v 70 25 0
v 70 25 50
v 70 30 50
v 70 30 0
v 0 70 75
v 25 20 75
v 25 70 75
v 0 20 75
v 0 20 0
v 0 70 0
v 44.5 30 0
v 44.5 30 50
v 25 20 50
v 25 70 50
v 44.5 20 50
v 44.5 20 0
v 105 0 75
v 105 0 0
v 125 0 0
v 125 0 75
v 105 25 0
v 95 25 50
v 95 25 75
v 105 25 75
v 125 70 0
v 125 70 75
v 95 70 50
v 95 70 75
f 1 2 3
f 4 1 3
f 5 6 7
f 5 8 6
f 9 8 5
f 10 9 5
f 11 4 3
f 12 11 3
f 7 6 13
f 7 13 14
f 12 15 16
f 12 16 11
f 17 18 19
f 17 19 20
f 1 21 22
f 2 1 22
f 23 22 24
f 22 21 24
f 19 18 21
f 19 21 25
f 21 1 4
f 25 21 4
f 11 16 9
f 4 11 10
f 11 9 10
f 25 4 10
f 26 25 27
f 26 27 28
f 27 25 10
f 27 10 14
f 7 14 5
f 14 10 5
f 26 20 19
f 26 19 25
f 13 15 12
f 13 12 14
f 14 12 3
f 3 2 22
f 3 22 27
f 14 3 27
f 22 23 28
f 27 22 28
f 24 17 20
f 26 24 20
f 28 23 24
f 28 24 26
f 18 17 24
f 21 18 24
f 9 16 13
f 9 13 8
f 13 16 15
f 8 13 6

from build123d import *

# Parameters (mm, degrees)
F0_W     = 70
F0_H     = 75
F1_DEPTH = 125
F3_START = -20
F2_W     = 20
F2_H     = 75
F3_DEPTH = 105.001
F5_START = -55
F4_W     = 10
F4_H     = 75
F5_DEPTH = 25.5
F7_START = -30
F6_W     = 70
F6_H     = 25
F7_DEPTH = 70
F9_START = -20
F8_W     = 5
F8_H     = 75
F9_DEPTH = 60.5


with BuildPart() as f1:
    # F0 (on Right) → F1 (new body)
    with BuildSketch(Plane.YZ):
        with Locations((35, 37.5)):
            Rectangle(F0_W, F0_H)
    extrude(amount=F1_DEPTH)

    # F2 (on face) → F3 (cut)
    with BuildSketch(Plane.YZ.offset(125).offset(F3_START)):
        with Locations((10, 37.5)):
            Rectangle(F2_W, F2_H)
    extrude(amount=-F3_DEPTH, mode=Mode.SUBTRACT)

    # F4 (on face) → F5 (cut)
    with BuildSketch(Plane.YZ.offset(125).offset(F5_START)):
        with Locations((25, 37.5)):
            Rectangle(F4_W, F4_H)
    extrude(amount=-F5_DEPTH, mode=Mode.SUBTRACT)

    # F6 (on face) → F7 (cut)
    with BuildSketch(Plane.YZ.offset(125).offset(F7_START)):
        with Locations((35, 62.5)):
            Rectangle(F6_W, F6_H)
    extrude(amount=-F7_DEPTH, mode=Mode.SUBTRACT)

    # F8 (on face) → F9 (cut)
    with BuildSketch(Plane.YZ.offset(125).offset(F9_START)):
        with Locations((22.5, 37.5)):
            Rectangle(F8_W, F8_H)
    extrude(amount=-F9_DEPTH, mode=Mode.SUBTRACT)


solid = f1.part
